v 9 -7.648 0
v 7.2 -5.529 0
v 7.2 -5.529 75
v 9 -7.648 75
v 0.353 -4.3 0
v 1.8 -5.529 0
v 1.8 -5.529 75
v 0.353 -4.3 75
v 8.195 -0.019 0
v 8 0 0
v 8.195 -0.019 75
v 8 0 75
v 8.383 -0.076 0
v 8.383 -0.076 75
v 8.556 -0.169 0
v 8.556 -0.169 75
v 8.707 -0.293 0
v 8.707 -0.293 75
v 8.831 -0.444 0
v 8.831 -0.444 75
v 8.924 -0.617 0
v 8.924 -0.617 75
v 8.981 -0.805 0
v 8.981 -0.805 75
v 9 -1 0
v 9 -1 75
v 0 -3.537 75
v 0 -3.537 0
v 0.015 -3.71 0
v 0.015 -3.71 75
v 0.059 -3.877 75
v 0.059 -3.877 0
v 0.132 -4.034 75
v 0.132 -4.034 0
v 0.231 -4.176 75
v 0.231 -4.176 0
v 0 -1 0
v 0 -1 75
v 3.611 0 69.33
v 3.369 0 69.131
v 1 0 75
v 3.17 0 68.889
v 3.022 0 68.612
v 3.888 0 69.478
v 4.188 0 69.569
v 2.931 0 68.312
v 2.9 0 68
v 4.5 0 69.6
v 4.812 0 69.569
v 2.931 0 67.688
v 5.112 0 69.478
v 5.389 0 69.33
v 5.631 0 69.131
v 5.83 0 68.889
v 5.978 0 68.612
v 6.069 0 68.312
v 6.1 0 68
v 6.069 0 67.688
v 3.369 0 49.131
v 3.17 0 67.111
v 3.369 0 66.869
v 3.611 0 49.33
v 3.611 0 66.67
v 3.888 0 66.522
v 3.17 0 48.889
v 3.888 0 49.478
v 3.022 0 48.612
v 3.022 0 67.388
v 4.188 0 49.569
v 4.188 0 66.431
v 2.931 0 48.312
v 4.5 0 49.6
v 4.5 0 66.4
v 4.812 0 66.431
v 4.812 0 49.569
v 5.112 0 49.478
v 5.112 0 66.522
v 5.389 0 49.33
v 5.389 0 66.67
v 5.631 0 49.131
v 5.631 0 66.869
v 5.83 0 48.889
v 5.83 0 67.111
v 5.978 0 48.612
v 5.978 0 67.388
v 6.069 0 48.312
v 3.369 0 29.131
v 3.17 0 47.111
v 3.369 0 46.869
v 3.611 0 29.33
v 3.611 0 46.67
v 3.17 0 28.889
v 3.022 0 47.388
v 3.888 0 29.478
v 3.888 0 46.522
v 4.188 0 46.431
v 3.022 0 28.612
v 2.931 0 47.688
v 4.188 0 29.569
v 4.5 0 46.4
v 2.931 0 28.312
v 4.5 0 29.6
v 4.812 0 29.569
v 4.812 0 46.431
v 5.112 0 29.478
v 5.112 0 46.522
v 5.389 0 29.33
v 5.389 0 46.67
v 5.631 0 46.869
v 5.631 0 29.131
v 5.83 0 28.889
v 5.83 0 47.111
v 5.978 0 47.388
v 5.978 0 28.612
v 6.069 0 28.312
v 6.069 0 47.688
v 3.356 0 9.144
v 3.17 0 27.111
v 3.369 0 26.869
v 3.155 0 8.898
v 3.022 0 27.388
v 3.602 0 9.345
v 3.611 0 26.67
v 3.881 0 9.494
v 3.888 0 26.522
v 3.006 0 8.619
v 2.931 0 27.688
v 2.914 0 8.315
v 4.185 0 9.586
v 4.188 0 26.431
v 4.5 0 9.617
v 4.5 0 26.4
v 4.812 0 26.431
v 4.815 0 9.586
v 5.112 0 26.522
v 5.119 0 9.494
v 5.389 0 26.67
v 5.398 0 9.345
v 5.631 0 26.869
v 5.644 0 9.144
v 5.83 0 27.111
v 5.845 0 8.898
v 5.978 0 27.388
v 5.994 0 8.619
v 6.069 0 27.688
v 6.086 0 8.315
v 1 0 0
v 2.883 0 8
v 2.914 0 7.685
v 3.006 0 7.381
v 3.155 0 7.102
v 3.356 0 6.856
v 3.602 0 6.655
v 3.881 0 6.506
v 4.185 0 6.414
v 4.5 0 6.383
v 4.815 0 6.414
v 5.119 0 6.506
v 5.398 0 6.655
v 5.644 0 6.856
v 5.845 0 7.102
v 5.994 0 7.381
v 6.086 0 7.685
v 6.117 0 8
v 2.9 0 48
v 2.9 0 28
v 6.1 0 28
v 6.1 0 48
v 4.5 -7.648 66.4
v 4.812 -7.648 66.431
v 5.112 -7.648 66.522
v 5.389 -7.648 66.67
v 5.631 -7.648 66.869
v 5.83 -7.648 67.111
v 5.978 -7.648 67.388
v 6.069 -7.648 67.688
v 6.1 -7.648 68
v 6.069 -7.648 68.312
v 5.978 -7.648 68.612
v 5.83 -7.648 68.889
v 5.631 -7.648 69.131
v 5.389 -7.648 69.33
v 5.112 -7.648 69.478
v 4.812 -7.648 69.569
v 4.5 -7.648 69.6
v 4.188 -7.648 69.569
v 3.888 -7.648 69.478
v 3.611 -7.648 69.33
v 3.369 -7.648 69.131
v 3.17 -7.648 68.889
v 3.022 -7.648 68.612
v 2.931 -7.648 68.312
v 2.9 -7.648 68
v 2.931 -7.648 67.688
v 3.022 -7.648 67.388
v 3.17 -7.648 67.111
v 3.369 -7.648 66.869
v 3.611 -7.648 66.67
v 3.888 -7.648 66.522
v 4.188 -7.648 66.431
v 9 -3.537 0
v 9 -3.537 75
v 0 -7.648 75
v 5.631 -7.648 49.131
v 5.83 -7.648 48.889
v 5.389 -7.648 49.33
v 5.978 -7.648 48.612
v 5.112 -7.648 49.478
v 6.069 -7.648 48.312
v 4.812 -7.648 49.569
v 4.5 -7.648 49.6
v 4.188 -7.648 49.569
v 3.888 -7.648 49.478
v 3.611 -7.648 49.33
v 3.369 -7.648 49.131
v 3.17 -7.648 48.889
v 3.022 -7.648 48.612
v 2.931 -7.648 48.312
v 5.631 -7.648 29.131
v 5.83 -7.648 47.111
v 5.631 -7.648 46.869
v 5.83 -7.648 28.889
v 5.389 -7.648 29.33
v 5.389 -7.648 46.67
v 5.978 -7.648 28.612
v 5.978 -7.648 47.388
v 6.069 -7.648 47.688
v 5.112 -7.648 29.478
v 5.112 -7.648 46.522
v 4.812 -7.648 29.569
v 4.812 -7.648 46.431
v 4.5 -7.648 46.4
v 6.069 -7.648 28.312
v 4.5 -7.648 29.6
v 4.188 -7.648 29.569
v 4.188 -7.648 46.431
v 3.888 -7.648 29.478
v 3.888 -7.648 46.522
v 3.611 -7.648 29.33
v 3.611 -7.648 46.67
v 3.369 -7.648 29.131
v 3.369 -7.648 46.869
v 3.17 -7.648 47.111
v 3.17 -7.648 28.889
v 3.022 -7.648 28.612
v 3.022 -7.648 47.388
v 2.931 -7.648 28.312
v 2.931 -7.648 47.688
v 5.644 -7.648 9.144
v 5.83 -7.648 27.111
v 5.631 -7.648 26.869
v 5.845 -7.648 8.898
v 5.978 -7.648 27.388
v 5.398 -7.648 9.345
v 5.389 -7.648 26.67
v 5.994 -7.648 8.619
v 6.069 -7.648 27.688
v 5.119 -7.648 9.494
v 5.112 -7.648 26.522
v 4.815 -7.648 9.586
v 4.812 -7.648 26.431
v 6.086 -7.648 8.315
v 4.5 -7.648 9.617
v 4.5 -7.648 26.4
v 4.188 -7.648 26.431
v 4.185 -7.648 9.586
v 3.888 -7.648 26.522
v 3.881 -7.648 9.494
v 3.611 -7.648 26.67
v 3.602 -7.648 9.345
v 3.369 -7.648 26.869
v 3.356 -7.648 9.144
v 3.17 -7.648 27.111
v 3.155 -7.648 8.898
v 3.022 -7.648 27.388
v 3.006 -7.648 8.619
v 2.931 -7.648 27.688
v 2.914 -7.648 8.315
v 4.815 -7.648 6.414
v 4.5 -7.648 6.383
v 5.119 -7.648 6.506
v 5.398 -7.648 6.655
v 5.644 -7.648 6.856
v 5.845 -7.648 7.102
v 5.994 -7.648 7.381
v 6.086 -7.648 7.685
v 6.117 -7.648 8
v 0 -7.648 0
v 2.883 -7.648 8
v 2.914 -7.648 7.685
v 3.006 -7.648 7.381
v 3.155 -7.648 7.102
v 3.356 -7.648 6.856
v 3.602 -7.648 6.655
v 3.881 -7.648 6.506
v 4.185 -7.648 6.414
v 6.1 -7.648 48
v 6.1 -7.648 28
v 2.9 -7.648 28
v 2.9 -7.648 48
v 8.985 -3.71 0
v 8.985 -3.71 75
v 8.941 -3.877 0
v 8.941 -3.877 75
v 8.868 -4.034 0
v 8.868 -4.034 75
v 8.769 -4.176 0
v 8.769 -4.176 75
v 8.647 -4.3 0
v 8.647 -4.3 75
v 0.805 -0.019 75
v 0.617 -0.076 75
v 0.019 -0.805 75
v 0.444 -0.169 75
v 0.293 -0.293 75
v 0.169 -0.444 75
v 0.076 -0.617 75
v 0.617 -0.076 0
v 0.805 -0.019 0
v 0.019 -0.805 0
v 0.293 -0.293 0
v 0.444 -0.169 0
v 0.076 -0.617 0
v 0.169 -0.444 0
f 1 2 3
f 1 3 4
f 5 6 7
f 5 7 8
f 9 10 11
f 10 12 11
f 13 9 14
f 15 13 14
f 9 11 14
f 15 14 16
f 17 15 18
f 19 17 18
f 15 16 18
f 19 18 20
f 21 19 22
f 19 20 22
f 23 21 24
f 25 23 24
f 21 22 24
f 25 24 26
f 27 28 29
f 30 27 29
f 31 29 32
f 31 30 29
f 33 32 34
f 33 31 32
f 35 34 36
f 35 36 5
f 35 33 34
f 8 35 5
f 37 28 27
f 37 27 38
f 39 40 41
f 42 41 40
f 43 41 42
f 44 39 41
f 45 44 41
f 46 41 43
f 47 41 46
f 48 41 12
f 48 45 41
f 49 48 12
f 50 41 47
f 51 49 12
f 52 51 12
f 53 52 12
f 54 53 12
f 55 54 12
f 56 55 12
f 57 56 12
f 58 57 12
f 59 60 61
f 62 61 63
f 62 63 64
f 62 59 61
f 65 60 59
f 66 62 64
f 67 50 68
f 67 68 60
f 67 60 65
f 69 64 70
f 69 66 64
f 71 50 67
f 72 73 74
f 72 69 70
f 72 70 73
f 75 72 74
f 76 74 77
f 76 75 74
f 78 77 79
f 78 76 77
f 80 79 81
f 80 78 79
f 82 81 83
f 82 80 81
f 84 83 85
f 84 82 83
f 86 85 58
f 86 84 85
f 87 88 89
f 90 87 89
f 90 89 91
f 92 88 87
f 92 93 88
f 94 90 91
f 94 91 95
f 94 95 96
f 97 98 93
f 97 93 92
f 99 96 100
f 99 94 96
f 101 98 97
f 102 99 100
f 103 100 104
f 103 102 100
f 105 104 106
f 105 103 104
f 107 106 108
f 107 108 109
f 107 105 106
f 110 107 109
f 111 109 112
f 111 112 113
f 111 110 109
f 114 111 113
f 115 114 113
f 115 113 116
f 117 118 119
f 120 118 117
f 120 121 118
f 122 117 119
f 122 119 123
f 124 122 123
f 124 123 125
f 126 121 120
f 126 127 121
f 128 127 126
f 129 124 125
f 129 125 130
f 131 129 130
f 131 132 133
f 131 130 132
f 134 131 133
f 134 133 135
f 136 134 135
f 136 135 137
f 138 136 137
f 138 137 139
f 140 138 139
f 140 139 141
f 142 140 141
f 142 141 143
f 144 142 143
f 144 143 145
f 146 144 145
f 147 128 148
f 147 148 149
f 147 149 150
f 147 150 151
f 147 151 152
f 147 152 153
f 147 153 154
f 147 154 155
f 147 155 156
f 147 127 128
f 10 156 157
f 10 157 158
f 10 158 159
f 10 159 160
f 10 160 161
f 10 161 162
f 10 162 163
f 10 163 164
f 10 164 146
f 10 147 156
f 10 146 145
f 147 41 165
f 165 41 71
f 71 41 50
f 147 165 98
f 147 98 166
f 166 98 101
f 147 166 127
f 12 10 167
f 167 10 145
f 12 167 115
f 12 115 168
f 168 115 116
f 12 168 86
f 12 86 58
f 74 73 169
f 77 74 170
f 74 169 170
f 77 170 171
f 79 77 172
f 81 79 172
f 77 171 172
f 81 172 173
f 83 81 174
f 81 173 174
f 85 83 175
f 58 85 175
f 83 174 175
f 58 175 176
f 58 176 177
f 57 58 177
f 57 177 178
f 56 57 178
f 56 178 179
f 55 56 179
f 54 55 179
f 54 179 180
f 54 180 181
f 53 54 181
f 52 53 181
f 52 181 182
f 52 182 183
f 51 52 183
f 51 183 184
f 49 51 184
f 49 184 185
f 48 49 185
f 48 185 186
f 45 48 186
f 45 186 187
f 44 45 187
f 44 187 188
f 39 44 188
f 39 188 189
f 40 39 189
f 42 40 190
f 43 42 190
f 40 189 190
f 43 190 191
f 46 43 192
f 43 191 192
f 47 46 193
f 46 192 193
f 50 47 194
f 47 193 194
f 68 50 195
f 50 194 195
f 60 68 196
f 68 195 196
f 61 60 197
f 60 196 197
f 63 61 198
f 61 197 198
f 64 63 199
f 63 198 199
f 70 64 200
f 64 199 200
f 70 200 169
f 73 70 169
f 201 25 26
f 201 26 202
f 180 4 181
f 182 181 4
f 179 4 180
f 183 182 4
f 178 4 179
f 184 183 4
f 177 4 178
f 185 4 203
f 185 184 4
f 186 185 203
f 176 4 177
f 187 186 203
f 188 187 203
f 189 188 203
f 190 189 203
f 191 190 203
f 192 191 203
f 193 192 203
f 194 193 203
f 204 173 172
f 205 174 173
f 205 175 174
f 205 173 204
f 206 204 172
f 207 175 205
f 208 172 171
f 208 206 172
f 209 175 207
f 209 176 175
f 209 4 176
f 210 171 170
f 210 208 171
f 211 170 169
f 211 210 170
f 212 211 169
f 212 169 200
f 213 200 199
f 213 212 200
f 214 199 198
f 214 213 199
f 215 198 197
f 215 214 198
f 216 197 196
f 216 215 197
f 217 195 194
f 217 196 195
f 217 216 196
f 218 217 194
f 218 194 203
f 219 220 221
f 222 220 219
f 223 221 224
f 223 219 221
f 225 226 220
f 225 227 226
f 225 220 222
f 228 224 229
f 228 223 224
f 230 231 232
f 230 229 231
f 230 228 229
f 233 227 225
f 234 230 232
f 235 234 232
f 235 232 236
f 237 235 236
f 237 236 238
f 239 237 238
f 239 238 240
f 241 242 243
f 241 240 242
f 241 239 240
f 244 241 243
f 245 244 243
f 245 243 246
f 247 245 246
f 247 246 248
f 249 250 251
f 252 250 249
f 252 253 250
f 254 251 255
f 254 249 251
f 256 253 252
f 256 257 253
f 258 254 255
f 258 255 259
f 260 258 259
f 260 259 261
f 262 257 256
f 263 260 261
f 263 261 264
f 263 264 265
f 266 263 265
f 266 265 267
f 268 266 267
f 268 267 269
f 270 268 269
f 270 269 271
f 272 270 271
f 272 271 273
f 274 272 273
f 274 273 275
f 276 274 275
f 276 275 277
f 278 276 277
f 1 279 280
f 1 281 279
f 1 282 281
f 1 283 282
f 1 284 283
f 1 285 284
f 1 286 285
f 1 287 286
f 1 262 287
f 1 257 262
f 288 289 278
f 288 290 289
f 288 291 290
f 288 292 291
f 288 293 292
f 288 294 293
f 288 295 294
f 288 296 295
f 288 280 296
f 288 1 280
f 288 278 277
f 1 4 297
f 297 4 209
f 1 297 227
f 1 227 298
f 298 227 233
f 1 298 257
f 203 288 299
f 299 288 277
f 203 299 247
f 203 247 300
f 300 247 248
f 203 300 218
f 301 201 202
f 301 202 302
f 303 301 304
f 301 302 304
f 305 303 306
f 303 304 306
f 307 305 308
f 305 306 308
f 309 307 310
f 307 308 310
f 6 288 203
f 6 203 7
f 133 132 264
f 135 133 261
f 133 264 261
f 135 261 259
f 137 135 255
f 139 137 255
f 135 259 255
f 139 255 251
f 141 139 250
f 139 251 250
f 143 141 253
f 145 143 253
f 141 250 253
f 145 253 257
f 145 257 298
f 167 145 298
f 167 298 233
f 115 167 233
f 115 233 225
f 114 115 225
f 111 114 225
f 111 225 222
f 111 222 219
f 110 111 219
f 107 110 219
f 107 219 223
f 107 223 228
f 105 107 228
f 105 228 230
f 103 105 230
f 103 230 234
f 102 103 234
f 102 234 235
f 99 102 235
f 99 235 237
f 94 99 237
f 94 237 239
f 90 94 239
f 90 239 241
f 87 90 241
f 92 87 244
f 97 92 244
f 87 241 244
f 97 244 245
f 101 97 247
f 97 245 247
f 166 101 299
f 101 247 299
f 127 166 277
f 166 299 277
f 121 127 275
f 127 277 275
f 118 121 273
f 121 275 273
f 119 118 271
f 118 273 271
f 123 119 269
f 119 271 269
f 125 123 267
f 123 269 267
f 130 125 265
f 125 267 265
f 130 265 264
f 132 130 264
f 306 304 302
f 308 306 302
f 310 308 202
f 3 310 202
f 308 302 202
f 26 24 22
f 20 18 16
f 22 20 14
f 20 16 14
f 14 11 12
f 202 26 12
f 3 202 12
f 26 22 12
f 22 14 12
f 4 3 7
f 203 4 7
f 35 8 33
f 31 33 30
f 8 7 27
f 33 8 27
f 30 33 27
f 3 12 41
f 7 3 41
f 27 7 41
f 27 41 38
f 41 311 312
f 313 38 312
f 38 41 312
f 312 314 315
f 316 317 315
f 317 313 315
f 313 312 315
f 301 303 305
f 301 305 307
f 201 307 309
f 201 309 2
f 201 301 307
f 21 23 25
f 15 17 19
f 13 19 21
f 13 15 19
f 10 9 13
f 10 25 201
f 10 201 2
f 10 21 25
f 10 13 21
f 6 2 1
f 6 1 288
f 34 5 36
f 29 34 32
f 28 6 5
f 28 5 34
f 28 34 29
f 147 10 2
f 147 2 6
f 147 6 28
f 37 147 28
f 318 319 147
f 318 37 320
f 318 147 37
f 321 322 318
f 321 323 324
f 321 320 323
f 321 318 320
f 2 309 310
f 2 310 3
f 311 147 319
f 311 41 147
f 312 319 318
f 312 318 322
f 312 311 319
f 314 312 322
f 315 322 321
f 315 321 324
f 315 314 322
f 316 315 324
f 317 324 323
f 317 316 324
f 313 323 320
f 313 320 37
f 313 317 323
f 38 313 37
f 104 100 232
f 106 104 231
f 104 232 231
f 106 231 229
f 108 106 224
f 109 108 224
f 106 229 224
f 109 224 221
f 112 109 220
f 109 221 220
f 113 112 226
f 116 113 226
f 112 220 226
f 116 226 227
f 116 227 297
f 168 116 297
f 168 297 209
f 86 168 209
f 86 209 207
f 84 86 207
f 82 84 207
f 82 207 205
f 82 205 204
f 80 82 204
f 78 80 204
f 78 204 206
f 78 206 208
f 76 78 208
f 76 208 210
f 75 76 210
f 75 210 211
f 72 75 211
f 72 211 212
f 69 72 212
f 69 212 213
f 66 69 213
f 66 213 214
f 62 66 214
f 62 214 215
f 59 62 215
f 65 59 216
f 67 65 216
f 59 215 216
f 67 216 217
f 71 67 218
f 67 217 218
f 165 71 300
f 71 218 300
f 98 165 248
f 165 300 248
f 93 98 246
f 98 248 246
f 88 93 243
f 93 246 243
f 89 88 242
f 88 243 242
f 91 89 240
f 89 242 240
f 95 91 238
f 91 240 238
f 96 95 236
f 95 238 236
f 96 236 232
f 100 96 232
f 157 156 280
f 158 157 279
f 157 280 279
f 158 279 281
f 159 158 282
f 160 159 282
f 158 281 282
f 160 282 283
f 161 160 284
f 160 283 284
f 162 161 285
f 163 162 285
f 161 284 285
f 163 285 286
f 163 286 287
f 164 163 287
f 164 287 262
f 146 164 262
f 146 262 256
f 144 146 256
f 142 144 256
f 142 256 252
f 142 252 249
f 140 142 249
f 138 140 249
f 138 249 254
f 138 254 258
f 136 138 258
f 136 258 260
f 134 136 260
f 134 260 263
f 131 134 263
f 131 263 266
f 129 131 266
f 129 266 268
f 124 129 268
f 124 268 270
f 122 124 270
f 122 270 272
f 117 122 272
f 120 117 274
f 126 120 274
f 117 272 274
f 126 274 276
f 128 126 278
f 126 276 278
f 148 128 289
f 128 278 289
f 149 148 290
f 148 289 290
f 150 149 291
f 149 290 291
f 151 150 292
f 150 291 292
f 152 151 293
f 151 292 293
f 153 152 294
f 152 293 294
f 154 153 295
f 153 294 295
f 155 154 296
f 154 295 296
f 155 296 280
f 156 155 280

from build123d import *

# Parameters (mm, degrees)
EXTRUDE_1_DEPTH     = 75
FILLET_1_R          = 1
FILLET_2_R          = 1
SKETCH_2_R          = 1.6
SKETCH_2_R_2        = 1.617183579
CUT_EXTRUDE_1_DEPTH = 14


with BuildPart() as part:
    # 草图1 → 凸台-拉伸1 (new body)
    with BuildSketch(Plane.XY):
        Polygon((0, 0), (9, 0), (9, -4), (7.2, -5.529317293), (9, -7.647909697), (0, -7.647909697), (1.8, -5.529317293), (0, -4), align=None)
    extrude(amount=EXTRUDE_1_DEPTH)

    # 圆角1
    fillet_1_edges = [part.edges().sort_by_distance(p)[0] for p in [
        (0, 0, 37.5),
        (9, 0, 37.5),
    ]]
    fillet(fillet_1_edges, radius=FILLET_1_R)

    # 圆角2
    fillet_2_edges = [part.edges().sort_by_distance(p)[0] for p in [
        (9, -4, 37.5),
        (0, -4, 37.5),
    ]]
    fillet(fillet_2_edges, radius=FILLET_2_R)

    # 草图2 → 切除-拉伸1 (cut)
    with BuildSketch(Plane.XZ.offset(7.647909697)):
        with Locations(Location((4.5, 68, 0), (0, 0, 270))):
            Circle(SKETCH_2_R)
        with Locations(Location((4.5, 48, 0), (0, 0, 270))):
            Circle(SKETCH_2_R)
        with Locations(Location((4.5, 28, 0), (0, 0, 270))):
            Circle(SKETCH_2_R)
        with Locations(Location((4.5, 8, 0), (0, 0, 270))):
            Circle(SKETCH_2_R_2)
    extrude(amount=-CUT_EXTRUDE_1_DEPTH, mode=Mode.SUBTRACT)


solid = part.part
